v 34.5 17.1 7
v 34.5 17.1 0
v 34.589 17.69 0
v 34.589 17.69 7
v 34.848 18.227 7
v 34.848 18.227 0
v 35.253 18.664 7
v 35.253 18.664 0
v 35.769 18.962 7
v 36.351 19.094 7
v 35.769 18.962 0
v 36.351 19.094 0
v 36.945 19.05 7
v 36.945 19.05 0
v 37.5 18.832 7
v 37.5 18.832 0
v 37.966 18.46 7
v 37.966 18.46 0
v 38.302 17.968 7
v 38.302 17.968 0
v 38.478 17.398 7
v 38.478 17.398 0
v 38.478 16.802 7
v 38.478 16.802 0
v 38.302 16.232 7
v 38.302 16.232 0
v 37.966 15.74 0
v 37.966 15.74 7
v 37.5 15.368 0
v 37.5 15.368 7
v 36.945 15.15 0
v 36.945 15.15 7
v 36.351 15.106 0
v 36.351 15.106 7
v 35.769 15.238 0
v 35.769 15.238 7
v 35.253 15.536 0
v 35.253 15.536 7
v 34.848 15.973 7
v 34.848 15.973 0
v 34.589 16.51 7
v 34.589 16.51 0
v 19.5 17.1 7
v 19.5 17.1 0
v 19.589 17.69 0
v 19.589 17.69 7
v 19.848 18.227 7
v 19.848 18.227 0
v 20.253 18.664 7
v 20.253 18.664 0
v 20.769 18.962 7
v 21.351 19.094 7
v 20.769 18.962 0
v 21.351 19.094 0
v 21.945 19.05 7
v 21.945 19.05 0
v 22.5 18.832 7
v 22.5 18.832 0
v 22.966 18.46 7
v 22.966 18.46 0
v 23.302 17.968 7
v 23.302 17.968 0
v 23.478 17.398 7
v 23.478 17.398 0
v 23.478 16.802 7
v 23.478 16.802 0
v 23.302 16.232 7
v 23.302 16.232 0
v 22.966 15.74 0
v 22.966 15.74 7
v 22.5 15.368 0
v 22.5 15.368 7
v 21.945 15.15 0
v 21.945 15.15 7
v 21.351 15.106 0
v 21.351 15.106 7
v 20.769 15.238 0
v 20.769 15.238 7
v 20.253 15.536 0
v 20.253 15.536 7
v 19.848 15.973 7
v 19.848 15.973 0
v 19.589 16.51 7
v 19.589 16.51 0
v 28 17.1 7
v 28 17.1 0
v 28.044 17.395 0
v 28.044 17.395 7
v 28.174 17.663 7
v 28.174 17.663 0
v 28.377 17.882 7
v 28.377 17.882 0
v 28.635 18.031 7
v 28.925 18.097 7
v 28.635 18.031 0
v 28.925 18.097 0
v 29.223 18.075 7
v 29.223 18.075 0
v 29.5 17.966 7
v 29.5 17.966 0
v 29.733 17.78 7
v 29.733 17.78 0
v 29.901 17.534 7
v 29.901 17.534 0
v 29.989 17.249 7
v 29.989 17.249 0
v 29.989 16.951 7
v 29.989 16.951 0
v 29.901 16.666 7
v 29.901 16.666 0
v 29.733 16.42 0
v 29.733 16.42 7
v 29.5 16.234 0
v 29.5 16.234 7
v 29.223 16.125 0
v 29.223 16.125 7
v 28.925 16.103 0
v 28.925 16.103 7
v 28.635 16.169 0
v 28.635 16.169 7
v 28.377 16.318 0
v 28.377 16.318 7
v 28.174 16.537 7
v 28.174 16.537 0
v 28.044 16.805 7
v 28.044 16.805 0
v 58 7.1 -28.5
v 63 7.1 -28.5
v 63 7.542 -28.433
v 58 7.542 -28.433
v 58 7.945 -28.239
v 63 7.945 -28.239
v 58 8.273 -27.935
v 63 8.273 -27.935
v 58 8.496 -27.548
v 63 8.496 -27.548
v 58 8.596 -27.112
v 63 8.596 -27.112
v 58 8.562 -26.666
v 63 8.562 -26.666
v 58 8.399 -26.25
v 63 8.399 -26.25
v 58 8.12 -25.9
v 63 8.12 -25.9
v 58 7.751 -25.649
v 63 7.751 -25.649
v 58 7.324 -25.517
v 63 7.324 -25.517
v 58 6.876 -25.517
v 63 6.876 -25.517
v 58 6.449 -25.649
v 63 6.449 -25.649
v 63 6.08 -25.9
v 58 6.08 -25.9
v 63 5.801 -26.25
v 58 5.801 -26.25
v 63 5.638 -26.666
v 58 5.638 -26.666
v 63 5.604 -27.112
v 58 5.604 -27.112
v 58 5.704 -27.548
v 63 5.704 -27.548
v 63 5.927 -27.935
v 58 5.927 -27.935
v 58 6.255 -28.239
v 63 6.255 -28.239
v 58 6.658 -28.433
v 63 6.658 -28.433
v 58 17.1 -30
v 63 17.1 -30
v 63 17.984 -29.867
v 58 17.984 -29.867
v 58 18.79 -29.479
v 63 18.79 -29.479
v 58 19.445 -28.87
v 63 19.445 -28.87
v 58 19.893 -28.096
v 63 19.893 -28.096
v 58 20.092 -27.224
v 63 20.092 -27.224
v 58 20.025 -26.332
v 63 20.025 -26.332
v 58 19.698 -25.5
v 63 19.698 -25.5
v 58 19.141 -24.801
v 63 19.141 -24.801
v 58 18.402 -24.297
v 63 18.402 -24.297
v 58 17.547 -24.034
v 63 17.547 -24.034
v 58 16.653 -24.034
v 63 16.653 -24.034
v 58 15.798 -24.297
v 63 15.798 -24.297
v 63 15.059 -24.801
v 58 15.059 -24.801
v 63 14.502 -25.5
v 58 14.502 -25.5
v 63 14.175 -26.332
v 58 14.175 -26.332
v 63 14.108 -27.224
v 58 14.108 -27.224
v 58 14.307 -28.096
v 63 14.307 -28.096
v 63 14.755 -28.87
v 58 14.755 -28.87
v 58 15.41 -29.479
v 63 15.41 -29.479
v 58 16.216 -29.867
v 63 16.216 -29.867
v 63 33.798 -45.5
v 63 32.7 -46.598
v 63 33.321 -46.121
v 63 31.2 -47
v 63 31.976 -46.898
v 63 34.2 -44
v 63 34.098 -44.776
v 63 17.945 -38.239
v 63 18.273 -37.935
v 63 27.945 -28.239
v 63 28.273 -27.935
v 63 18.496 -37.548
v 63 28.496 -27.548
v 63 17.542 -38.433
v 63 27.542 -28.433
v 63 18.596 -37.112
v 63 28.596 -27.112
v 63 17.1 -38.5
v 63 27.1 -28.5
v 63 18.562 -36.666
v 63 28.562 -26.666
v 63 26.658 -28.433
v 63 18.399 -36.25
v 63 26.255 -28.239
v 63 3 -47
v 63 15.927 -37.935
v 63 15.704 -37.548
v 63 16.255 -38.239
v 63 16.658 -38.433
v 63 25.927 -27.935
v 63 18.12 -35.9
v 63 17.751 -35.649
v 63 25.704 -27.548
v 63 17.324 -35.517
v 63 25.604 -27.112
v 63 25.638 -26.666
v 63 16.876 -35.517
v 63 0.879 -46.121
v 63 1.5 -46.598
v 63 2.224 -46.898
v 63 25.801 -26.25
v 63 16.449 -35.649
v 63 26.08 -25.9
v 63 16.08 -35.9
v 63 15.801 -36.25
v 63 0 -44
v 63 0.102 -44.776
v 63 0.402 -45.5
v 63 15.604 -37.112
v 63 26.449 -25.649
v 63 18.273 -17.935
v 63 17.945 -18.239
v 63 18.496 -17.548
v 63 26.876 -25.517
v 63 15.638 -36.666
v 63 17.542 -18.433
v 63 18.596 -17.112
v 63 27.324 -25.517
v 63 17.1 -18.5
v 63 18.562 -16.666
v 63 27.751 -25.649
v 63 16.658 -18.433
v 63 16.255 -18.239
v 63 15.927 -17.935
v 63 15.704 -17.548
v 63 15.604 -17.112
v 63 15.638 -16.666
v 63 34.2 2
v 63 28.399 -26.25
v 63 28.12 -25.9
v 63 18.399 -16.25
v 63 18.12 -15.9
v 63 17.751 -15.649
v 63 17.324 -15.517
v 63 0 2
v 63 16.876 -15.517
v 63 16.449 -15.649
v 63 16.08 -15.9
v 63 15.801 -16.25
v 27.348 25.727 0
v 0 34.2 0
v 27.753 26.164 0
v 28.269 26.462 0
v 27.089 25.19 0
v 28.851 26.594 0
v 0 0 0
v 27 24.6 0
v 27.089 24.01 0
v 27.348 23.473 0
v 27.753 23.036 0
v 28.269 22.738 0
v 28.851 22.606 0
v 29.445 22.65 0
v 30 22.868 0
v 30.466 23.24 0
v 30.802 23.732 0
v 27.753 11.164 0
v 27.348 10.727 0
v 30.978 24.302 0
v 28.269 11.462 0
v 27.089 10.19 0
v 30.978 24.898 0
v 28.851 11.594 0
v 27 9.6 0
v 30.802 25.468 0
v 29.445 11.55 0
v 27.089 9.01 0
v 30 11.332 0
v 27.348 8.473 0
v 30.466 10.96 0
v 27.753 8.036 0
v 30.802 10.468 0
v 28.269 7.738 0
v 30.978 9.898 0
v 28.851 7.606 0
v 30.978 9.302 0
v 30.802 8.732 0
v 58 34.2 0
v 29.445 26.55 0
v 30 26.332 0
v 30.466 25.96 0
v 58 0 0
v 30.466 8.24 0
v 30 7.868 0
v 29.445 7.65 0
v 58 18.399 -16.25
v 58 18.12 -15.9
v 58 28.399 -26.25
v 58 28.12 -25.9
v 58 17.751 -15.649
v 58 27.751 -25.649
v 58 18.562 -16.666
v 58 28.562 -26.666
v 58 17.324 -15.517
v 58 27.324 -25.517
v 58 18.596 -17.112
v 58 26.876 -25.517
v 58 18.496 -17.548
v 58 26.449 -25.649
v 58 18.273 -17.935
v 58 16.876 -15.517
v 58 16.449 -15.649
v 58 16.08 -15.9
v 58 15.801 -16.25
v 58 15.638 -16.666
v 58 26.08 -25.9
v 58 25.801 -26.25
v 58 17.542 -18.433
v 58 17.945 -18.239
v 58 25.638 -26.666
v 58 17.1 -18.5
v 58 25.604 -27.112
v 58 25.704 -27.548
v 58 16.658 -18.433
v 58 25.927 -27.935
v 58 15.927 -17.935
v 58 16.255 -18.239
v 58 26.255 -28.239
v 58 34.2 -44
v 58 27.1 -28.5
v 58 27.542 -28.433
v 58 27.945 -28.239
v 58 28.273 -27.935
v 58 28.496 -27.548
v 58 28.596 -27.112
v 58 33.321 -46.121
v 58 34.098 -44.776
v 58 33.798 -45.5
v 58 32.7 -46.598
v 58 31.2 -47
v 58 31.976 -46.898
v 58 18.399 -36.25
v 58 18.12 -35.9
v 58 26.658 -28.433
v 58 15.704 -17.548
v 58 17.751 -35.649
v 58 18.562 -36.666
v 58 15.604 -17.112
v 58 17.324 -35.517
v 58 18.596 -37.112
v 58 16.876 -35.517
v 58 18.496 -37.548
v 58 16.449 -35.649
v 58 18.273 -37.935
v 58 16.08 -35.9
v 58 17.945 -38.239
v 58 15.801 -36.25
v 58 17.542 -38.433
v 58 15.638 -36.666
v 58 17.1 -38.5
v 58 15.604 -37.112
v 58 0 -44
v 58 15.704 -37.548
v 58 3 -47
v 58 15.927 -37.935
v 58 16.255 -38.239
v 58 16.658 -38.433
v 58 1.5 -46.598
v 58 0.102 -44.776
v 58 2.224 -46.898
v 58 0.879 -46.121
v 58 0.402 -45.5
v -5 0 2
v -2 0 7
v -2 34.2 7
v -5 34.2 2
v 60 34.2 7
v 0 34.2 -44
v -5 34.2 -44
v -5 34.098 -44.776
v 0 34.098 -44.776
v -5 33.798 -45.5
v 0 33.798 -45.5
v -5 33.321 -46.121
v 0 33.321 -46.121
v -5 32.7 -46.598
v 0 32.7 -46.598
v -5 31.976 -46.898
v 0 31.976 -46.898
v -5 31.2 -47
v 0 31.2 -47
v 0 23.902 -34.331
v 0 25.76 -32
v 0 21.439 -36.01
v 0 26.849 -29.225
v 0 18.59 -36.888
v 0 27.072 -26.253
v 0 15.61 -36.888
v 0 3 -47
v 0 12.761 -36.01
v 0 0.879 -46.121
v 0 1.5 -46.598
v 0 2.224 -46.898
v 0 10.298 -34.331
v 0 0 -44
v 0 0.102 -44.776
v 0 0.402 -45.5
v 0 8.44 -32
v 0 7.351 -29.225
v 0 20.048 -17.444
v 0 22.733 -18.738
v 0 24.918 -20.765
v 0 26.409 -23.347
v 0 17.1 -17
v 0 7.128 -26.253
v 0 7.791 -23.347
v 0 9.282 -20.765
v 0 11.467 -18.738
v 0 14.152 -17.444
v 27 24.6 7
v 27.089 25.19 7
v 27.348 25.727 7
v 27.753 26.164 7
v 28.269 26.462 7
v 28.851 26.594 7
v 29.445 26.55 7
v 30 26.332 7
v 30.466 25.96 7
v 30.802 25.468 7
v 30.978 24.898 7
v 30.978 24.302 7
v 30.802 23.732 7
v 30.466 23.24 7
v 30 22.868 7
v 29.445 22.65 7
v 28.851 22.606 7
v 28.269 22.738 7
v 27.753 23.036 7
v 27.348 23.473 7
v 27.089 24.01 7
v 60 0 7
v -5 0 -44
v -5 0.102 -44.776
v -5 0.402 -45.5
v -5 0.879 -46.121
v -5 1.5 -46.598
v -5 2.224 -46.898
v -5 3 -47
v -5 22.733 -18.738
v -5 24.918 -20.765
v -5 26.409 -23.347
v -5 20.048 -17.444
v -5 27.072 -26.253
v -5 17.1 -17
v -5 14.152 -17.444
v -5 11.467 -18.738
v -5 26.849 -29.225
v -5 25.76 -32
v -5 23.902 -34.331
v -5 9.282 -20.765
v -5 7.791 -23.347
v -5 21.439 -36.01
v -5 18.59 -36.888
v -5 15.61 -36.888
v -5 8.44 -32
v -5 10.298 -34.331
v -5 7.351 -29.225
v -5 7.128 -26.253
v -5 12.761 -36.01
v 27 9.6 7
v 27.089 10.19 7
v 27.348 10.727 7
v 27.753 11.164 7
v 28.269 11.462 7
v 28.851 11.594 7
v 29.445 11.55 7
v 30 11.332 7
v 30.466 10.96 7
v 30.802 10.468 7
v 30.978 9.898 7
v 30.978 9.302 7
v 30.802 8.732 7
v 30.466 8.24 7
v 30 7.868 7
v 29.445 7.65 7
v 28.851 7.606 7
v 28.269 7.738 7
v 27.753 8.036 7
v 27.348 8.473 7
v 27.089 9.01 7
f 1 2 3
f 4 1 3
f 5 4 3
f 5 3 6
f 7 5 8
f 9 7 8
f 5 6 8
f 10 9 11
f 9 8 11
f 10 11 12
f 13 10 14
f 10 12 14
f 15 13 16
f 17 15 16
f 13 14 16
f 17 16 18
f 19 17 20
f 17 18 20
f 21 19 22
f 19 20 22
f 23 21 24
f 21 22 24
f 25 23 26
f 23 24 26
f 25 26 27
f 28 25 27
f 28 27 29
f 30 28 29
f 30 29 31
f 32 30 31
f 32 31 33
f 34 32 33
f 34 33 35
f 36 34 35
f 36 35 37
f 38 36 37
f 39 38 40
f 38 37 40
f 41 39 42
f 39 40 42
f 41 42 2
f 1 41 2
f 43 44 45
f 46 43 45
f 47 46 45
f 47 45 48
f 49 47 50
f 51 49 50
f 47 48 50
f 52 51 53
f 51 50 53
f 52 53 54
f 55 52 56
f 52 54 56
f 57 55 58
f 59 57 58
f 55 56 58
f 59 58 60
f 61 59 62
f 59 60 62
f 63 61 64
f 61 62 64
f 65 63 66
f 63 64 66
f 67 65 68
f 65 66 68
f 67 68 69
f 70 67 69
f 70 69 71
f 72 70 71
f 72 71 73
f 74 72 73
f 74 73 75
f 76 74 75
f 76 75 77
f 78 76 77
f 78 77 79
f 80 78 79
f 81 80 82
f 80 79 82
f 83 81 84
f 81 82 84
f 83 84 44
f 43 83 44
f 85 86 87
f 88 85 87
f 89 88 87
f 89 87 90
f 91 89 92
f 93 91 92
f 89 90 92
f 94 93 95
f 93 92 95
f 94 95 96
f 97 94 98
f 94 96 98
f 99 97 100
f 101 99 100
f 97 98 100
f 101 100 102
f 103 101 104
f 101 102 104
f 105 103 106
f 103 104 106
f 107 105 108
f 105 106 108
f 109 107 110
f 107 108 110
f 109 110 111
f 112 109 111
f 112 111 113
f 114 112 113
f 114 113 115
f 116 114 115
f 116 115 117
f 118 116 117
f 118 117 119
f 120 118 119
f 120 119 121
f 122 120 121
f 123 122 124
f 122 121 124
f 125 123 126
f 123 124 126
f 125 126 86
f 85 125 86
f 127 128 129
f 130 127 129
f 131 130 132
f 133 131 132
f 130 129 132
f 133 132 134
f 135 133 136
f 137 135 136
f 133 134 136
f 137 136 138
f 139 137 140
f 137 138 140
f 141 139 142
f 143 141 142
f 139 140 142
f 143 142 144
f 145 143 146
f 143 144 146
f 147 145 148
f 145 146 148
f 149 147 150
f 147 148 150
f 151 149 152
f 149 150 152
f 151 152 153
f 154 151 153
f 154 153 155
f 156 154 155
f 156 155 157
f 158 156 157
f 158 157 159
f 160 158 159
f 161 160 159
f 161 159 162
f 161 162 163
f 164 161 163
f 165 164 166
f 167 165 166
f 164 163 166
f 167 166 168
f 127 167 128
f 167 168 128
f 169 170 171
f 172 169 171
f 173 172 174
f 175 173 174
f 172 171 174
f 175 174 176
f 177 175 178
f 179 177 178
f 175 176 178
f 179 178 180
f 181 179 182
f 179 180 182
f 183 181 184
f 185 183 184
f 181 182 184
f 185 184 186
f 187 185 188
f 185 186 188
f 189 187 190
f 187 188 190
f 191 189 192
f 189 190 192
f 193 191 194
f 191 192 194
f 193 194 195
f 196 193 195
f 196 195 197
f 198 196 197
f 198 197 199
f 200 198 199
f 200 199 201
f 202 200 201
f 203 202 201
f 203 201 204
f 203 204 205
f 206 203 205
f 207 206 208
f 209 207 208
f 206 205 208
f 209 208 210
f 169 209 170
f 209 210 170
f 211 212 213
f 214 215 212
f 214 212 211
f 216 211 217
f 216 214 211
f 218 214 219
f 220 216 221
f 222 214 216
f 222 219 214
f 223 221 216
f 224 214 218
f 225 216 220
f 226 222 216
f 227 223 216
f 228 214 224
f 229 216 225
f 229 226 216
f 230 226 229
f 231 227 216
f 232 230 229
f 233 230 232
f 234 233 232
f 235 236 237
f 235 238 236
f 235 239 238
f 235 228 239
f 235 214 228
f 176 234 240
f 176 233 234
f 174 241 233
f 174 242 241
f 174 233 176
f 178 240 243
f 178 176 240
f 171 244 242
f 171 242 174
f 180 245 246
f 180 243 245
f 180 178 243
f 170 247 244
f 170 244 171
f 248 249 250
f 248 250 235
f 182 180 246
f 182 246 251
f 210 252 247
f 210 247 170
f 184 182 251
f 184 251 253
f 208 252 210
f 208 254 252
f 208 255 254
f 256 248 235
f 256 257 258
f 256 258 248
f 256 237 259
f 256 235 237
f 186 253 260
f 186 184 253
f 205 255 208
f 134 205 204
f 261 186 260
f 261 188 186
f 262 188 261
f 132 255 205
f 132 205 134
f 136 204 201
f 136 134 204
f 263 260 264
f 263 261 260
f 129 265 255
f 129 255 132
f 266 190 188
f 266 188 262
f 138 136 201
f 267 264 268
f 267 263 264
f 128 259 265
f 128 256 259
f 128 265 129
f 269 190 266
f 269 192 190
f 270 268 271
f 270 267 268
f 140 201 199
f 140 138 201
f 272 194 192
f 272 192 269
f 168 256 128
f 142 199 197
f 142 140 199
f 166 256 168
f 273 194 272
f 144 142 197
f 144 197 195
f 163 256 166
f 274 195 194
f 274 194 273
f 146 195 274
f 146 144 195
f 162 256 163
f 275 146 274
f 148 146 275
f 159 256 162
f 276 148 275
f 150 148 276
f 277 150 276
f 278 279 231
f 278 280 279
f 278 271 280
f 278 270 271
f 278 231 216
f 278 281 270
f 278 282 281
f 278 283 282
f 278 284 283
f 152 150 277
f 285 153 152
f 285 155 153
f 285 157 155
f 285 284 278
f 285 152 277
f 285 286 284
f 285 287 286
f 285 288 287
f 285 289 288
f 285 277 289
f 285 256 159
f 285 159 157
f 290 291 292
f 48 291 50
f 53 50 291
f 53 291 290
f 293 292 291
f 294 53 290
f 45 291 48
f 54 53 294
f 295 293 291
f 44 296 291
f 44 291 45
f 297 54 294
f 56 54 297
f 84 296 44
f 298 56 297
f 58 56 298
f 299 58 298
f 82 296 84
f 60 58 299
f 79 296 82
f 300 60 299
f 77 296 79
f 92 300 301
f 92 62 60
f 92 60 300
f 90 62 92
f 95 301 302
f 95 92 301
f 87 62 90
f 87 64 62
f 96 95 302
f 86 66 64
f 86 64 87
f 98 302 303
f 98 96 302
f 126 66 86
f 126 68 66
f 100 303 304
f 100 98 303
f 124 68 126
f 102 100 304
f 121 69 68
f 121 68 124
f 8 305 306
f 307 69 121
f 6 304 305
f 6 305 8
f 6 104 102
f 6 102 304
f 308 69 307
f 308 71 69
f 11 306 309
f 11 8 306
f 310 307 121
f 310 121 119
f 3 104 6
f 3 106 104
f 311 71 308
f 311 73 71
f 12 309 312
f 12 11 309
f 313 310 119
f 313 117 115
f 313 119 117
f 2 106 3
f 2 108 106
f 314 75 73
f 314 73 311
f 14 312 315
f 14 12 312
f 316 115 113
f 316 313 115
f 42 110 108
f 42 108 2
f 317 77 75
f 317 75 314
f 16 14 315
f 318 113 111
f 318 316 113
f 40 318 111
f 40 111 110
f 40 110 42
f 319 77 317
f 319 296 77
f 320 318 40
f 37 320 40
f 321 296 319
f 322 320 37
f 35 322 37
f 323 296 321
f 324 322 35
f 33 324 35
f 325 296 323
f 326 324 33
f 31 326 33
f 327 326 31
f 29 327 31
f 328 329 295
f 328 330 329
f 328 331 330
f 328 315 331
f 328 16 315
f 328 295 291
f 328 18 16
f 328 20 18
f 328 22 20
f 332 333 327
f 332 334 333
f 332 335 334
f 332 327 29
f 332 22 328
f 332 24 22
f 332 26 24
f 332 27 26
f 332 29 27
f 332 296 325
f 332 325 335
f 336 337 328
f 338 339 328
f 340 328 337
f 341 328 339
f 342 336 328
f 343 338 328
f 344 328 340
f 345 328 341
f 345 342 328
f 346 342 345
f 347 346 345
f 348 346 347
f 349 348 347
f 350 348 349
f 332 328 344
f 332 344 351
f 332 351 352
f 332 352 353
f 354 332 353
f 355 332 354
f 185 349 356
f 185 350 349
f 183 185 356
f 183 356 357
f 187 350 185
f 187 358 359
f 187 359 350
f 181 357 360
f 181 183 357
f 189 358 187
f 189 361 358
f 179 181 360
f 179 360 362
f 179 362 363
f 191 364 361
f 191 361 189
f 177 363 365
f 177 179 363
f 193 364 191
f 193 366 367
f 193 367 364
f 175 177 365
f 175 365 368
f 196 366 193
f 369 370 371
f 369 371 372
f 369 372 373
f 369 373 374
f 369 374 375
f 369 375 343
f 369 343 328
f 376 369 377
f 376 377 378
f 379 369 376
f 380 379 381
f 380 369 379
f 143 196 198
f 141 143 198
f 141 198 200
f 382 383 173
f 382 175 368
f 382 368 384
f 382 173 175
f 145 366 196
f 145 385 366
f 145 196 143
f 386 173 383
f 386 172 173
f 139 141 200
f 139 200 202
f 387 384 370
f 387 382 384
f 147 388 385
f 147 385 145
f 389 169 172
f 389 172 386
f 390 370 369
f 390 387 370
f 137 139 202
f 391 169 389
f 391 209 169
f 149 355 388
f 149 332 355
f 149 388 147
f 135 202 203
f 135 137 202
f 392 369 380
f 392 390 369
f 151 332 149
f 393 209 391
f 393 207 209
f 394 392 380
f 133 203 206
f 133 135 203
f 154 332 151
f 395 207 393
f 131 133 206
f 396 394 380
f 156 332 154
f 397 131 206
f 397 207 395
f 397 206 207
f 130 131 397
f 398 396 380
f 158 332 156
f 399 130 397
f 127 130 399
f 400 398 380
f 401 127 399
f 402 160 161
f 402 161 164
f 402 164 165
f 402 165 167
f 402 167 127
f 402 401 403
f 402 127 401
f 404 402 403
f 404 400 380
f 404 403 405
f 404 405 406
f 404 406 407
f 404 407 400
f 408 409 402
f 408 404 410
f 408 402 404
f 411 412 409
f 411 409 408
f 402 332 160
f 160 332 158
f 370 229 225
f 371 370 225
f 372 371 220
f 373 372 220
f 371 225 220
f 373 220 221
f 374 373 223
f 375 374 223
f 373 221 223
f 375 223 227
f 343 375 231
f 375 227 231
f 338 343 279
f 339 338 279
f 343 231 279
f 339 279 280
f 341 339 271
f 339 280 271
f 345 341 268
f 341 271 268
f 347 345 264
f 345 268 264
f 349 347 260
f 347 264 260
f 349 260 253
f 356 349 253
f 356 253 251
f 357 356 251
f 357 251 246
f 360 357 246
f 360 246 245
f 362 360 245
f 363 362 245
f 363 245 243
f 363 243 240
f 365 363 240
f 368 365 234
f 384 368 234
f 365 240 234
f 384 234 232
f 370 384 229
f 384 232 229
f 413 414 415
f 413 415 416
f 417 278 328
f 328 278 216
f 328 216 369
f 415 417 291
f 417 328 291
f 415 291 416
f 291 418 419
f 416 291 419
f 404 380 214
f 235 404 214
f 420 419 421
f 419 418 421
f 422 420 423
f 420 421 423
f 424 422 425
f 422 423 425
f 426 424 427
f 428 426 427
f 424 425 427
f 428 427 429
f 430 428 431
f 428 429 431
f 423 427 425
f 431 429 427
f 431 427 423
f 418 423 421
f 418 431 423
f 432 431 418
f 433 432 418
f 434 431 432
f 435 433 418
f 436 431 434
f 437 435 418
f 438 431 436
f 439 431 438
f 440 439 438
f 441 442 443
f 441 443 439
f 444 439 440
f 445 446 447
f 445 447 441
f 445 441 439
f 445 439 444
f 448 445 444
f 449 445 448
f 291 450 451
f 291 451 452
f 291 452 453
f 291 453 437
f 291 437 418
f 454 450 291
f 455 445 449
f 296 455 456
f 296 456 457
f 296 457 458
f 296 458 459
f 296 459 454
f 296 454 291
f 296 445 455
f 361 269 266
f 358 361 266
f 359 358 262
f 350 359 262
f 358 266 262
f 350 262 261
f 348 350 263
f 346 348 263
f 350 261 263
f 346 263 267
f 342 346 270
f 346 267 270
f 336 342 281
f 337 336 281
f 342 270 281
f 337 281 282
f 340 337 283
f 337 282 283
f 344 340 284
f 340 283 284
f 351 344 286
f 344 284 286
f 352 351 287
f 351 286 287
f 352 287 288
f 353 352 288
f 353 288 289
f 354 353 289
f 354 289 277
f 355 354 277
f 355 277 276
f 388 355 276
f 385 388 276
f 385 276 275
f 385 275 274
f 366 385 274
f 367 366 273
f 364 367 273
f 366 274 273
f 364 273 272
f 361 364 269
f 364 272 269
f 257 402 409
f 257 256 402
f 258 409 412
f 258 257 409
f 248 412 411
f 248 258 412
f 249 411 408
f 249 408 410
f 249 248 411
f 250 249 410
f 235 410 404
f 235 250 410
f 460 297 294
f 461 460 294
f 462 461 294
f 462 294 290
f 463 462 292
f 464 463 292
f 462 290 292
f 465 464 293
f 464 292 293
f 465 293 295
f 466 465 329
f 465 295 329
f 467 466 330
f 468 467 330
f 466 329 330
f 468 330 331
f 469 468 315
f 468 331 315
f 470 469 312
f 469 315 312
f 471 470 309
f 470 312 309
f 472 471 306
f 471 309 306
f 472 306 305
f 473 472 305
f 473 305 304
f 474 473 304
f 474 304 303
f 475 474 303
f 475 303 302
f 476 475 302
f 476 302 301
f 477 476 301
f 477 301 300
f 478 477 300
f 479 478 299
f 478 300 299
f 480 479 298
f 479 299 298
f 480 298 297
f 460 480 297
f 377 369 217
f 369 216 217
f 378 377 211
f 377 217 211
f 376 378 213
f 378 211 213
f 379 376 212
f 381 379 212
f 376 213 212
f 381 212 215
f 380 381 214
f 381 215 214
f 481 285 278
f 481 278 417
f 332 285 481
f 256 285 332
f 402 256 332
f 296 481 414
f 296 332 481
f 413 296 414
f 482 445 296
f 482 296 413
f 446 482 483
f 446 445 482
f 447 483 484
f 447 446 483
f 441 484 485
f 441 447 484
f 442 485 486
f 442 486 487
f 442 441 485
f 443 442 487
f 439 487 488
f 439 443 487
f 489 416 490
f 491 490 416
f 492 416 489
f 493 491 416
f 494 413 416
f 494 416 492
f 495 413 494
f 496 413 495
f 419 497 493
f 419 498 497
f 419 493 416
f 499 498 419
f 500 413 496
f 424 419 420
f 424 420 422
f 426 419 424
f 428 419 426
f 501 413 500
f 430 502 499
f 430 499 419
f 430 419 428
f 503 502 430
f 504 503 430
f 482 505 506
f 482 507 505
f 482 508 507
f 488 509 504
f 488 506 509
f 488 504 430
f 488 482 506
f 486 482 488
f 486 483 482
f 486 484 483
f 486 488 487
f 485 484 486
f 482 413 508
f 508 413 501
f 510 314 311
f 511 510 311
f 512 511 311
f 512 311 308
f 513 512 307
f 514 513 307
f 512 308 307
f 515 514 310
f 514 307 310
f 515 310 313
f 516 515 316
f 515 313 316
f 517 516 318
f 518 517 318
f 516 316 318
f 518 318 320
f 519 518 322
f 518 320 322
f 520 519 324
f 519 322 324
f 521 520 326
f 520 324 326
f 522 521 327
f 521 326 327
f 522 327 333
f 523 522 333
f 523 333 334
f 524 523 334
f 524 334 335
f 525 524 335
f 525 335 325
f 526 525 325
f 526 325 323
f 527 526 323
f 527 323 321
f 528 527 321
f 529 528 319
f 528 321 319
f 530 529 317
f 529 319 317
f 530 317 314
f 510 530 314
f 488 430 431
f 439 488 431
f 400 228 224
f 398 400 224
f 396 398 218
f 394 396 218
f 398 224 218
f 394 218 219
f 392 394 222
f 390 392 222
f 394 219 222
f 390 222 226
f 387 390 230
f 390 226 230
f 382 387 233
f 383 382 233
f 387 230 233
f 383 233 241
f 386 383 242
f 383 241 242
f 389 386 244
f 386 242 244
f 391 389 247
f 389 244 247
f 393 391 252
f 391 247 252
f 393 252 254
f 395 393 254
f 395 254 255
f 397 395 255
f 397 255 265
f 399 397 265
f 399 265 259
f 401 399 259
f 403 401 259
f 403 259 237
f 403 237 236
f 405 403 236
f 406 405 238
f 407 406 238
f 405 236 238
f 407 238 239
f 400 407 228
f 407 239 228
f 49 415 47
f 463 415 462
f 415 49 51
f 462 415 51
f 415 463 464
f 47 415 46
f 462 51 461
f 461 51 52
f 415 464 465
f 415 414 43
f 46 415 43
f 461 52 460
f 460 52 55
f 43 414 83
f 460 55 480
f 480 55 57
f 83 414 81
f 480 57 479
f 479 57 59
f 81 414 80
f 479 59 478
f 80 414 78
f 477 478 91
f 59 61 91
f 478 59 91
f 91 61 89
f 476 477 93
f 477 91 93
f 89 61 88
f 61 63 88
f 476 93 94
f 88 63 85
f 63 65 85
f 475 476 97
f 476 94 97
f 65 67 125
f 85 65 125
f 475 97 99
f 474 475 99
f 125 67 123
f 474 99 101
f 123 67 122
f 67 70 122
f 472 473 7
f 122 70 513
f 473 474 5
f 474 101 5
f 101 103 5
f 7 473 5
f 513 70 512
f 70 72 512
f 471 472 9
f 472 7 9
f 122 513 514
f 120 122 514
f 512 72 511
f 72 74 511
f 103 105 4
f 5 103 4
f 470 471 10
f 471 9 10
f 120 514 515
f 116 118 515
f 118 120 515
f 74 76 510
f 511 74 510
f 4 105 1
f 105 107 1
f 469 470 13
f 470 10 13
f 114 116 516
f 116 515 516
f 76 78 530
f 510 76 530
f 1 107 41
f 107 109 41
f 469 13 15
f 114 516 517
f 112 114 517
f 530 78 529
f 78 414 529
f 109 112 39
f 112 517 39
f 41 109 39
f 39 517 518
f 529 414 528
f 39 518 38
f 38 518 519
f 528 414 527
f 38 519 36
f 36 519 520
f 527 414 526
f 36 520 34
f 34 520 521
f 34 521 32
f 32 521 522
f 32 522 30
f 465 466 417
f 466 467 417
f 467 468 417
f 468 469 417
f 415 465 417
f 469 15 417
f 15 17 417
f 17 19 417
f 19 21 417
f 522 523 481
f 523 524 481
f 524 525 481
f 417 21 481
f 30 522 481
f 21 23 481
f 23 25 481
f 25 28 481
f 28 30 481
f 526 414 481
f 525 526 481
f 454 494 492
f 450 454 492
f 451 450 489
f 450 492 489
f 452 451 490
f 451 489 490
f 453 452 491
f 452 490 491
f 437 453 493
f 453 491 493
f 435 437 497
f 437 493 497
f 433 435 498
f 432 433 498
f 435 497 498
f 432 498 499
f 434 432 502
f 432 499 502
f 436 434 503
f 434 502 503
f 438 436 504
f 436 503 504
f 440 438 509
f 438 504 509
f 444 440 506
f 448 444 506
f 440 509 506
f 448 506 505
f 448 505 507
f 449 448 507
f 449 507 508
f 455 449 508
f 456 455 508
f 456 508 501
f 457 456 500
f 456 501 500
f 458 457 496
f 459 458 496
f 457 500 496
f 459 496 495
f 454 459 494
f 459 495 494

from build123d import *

# Parameters (mm, degrees)
BOSS_EXTRUDE1_DEPTH = 34.2
SKETCH4_R           = 2
SKETCH4_R_2         = 1
CUT_EXTRUDE3_DEPTH  = 7
FILLET1_R           = 3
SKETCH5_R           = 10
CUT_EXTRUDE4_DEPTH  = 5
SKETCH6_R           = 3
SKETCH6_R_2         = 1.5
CUT_EXTRUDE5_DEPTH  = 5


with BuildPart() as part:
    # Sketch1 → Boss-Extrude1 (new body)
    with BuildSketch(Plane(origin=(0, 0, 0), x_dir=(1, 0, 0), z_dir=(0, 1, 0))):
        Polygon((0, 0), (58, 0), (58, 47), (63, 47), (63, -2), (60, -7), (58, -7), (0, -7), (-2, -7), (-5, -2), (-5, 47), (0, 47), align=None)
    extrude(amount=BOSS_EXTRUDE1_DEPTH)

    # Sketch4 → Cut-Extrude3 (cut)
    with BuildSketch(Plane(origin=(0, 0, 0), x_dir=(-1, 0, 0), z_dir=(0, 0, -1))):
        with Locations((-29, 24.6)):
            Circle(SKETCH4_R)
        with Locations((-36.5, 17.1)):
            Circle(SKETCH4_R)
        with Locations((-21.5, 17.1)):
            Circle(SKETCH4_R)
        with Locations((-29, 9.6)):
            Circle(SKETCH4_R)
        with Locations((-29, 17.1)):
            Circle(SKETCH4_R_2)
    extrude(amount=-CUT_EXTRUDE3_DEPTH, mode=Mode.SUBTRACT)

    # Fillet1
    fillet1_edges = [part.edges().sort_by_distance(p)[0] for p in [
        (60.5, 0, -47),
        (-2.5, 0, -47),
        (60.5, 34.2, -47),
        (-2.5, 34.2, -47),
    ]]
    fillet(fillet1_edges, radius=FILLET1_R)

    # Sketch5 → Cut-Extrude4 (cut)
    with BuildSketch(Plane.ZY.offset(5)):
        with Locations((-27, 17.1)):
            Circle(SKETCH5_R)
    extrude(amount=-CUT_EXTRUDE4_DEPTH, mode=Mode.SUBTRACT)

    # Sketch6 → Cut-Extrude5 (cut)
    with BuildSketch(Plane(origin=(63, 0, 0), x_dir=(0, 0, -1), z_dir=(1, 0, 0))):
        with Locations((27, 17.1)):
            Circle(SKETCH6_R)
        with Locations((27, 27.1)):
            Circle(SKETCH6_R_2)
        with Locations((37, 17.1)):
            Circle(SKETCH6_R_2)
        with Locations((27, 7.1)):
            Circle(SKETCH6_R_2)
        with Locations((17, 17.1)):
            Circle(SKETCH6_R_2)
    extrude(amount=-CUT_EXTRUDE5_DEPTH, mode=Mode.SUBTRACT)


solid = part.part
